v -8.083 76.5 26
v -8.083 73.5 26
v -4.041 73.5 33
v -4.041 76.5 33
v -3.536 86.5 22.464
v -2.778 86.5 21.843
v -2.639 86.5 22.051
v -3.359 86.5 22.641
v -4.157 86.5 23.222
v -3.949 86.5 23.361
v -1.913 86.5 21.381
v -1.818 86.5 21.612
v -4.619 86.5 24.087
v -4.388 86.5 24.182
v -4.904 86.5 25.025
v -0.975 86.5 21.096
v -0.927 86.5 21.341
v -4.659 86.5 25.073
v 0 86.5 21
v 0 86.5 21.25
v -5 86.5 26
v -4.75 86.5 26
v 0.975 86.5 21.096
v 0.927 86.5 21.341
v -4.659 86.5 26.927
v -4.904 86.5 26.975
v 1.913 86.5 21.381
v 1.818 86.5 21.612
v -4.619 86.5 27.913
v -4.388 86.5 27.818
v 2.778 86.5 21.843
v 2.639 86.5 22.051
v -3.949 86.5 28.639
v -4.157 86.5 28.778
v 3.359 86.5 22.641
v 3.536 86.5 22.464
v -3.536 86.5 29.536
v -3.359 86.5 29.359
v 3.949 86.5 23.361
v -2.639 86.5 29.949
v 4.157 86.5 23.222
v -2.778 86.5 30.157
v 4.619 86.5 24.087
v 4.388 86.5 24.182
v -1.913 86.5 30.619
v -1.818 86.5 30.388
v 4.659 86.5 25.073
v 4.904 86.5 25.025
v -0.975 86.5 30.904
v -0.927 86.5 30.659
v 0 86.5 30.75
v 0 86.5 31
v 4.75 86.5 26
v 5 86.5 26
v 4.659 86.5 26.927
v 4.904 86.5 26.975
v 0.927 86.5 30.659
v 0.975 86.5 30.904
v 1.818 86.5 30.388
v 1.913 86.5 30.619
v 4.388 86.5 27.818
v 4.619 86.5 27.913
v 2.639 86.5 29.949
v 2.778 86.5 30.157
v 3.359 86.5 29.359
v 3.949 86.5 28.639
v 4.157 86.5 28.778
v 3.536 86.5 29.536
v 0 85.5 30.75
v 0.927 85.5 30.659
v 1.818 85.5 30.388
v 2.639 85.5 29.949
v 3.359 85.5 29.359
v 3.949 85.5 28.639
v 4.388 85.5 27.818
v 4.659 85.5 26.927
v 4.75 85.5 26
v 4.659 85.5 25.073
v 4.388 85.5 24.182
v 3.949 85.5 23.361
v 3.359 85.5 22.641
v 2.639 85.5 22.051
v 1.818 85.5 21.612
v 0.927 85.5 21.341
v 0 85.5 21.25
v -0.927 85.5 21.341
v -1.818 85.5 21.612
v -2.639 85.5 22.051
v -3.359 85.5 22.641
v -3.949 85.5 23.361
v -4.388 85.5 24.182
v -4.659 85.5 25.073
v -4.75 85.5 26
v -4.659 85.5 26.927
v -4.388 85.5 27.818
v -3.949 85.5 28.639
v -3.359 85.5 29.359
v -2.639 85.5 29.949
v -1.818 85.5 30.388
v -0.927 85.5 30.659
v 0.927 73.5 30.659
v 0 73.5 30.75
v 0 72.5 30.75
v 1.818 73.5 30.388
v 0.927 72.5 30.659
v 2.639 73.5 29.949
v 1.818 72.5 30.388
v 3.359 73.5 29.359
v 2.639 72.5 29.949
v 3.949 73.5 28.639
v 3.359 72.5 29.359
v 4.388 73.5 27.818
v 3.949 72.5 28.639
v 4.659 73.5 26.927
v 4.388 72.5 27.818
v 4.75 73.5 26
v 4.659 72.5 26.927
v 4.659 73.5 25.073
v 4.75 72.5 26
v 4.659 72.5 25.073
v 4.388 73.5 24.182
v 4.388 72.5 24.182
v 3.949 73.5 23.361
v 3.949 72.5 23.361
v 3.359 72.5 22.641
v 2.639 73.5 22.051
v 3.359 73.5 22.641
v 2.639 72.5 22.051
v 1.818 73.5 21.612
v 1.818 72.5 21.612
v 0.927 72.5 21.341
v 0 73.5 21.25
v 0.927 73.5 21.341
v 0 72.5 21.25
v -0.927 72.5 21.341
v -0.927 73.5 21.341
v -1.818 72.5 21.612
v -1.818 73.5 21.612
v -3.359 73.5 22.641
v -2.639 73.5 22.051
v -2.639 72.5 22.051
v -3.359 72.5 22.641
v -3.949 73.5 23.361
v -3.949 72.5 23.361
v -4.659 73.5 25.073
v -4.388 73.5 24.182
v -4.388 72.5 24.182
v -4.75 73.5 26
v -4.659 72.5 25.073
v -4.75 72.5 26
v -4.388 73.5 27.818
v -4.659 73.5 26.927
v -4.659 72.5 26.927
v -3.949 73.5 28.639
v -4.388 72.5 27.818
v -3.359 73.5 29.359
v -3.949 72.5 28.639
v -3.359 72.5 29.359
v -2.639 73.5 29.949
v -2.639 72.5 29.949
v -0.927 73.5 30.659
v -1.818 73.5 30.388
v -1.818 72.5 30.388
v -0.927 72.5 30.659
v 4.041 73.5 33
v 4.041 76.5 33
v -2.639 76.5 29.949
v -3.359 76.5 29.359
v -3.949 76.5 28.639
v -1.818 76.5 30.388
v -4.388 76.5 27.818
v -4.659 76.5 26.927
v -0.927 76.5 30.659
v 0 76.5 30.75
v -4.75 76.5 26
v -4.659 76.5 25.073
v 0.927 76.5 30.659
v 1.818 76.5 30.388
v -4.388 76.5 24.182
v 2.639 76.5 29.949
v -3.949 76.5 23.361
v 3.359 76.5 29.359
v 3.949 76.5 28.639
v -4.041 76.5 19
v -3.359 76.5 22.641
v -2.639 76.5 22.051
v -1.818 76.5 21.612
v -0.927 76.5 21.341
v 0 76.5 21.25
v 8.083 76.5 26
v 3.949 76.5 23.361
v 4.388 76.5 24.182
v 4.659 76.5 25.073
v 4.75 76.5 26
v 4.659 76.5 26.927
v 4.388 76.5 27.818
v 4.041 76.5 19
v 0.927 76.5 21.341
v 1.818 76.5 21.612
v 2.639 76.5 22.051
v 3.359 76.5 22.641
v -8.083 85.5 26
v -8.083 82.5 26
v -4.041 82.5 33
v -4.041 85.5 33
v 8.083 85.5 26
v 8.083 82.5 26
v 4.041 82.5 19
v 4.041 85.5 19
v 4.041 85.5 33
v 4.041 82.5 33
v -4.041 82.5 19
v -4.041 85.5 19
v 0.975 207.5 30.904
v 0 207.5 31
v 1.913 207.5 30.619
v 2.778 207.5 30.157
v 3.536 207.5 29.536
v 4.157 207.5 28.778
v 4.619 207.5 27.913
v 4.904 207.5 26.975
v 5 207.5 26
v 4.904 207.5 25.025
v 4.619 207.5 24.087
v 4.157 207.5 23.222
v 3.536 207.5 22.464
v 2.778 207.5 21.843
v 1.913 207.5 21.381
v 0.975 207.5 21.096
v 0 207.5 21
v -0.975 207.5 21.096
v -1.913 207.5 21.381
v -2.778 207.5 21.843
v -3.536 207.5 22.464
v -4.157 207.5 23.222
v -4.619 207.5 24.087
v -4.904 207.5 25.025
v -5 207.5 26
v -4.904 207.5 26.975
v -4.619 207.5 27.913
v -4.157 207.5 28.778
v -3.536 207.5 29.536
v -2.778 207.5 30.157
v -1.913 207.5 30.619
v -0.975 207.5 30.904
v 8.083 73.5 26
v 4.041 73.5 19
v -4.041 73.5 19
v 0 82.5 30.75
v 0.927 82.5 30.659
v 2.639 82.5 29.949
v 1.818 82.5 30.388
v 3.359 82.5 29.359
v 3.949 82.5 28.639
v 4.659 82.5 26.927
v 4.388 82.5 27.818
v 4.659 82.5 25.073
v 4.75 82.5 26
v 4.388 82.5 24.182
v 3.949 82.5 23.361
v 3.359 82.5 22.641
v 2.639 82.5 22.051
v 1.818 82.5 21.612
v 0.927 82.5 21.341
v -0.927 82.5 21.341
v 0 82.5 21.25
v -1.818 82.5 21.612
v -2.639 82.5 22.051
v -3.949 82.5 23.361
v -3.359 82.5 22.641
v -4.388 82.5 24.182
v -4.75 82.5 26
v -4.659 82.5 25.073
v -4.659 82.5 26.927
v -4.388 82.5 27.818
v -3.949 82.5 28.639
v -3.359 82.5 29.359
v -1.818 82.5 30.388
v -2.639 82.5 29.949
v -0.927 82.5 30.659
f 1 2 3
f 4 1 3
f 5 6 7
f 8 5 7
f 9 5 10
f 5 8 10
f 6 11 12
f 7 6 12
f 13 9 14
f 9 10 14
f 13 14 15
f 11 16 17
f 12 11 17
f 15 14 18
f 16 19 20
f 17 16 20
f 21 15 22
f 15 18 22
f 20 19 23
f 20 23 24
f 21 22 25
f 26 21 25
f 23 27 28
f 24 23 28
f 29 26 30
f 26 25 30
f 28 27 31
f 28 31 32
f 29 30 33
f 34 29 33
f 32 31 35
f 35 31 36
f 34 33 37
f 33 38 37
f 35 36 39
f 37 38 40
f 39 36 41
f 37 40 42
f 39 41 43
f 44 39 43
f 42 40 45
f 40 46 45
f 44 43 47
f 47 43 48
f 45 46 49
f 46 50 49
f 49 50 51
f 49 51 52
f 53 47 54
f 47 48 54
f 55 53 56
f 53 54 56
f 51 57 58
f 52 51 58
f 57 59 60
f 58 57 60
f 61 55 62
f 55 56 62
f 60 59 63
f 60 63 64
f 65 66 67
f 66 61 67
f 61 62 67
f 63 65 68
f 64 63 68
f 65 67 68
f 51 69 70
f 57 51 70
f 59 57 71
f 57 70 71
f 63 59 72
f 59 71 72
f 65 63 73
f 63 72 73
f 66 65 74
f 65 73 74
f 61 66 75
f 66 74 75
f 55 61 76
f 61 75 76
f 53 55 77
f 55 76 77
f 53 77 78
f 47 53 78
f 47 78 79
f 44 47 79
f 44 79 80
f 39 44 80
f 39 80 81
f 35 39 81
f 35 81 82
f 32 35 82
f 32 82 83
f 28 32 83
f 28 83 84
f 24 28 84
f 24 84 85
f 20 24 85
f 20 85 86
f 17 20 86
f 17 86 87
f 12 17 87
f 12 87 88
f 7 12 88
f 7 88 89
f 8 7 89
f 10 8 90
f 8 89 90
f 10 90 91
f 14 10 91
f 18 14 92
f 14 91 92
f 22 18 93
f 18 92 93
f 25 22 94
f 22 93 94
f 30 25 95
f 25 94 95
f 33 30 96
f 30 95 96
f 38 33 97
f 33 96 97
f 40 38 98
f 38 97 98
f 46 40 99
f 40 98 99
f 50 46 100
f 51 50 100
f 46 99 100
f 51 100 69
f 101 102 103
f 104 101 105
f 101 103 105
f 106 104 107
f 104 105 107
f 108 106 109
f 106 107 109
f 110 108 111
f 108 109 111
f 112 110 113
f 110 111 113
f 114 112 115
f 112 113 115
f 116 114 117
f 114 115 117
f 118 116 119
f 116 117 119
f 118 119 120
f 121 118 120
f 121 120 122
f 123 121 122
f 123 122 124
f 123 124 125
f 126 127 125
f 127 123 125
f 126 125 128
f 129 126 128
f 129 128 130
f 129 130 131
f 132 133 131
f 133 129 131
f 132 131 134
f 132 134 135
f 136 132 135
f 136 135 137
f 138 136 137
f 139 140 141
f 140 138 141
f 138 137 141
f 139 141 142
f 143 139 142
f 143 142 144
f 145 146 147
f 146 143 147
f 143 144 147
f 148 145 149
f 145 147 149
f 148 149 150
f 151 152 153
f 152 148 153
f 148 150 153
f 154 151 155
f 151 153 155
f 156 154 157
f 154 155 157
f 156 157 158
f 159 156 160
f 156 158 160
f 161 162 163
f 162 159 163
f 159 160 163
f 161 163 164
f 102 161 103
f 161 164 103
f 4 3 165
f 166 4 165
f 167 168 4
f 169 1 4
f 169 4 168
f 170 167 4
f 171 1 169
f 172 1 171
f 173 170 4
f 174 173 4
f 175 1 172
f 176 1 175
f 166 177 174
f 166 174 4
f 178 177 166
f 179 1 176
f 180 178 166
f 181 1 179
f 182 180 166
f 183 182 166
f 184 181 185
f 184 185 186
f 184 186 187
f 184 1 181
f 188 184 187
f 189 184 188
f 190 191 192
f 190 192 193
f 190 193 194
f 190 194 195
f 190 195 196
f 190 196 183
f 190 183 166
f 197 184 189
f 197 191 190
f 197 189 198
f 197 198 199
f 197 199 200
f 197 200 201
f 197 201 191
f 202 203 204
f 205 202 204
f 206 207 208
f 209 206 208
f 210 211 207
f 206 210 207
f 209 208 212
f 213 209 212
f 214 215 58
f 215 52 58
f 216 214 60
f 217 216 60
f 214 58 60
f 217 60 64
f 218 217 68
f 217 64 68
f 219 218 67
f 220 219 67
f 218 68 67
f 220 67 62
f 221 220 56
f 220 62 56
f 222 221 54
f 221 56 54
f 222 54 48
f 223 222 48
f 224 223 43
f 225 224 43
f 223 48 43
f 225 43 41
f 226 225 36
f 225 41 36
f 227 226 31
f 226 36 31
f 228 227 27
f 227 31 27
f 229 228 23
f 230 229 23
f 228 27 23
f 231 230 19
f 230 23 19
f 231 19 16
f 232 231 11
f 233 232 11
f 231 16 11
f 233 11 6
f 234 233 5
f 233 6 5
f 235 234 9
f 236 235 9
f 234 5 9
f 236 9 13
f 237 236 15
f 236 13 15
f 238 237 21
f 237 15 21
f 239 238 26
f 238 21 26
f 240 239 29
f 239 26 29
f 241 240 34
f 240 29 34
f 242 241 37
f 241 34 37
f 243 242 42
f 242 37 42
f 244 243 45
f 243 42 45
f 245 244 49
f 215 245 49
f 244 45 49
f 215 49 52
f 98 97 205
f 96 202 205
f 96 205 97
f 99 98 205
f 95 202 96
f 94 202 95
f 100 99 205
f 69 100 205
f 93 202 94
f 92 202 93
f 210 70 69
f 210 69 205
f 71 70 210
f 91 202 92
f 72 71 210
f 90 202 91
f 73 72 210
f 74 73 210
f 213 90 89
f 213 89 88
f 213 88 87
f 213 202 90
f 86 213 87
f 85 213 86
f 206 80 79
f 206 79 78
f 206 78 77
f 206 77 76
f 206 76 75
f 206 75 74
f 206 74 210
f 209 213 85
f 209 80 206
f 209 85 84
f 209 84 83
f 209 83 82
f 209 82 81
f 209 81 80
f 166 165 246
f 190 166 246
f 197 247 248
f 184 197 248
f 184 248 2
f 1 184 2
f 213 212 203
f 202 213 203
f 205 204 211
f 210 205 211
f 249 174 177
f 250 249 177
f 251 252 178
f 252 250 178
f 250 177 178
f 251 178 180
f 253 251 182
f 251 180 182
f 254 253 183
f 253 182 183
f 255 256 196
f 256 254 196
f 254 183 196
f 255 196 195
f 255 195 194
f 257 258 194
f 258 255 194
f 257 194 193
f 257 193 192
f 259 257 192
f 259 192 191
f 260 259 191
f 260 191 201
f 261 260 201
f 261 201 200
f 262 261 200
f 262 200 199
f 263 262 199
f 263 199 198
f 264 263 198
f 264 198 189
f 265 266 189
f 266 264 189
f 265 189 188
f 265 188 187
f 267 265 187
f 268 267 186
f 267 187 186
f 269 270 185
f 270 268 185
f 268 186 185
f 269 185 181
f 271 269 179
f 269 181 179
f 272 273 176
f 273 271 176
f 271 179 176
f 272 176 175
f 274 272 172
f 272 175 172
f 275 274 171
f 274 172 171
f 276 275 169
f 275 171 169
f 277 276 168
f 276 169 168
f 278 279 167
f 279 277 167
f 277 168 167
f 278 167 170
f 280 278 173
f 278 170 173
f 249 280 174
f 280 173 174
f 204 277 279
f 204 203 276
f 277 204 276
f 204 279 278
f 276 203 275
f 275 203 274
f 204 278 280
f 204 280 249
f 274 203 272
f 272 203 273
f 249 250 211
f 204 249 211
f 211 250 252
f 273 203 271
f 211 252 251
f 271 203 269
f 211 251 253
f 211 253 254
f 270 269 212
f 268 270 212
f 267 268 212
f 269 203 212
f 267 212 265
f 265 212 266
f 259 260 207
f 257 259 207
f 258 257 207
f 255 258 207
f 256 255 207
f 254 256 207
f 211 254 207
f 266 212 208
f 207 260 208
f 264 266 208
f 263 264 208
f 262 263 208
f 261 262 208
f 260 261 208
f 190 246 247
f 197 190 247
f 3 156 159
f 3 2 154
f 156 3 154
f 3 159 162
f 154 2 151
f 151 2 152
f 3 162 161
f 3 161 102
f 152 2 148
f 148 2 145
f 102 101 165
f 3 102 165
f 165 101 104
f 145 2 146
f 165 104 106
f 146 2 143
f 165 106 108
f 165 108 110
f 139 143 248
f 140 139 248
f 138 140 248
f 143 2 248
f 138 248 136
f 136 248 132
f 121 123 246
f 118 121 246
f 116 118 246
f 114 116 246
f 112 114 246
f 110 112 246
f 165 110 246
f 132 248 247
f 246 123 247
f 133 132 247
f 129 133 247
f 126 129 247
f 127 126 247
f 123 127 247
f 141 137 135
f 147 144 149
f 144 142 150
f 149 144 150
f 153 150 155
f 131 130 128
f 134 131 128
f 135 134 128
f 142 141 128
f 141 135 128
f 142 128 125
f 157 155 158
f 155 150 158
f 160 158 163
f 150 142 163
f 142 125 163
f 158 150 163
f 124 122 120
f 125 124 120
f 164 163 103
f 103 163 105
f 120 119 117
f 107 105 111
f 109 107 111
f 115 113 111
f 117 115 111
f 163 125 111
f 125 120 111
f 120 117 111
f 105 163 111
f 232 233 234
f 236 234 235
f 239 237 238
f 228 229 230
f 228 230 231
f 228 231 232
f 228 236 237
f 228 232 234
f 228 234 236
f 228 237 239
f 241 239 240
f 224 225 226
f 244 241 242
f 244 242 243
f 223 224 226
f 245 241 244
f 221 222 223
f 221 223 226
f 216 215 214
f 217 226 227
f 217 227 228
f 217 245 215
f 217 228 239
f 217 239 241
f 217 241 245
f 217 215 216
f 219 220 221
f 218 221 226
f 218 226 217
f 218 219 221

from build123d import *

# Parameters (mm, degrees)
SKETCH1_R           = 4.75
BOSS_EXTRUDE1_DEPTH = 14
BOSS_EXTRUDE2_DEPTH = 3
BOSS_EXTRUDE3_DEPTH = 3
SKETCH4_R           = 5
BOSS_EXTRUDE4_DEPTH = 15
SKETCH5_R           = 5
BOSS_EXTRUDE5_DEPTH = 106


with BuildPart() as part:
    # Sketch1 → Boss-Extrude1 (new body)
    with BuildSketch(Plane(origin=(0, 72.5, 0), x_dir=(1, 0, 0), z_dir=(0, 1, 0))):
        with Locations(Location((0, -26, 0), (0, 0, 270))):
            Circle(SKETCH1_R)
    extrude(amount=BOSS_EXTRUDE1_DEPTH)

    # Sketch2 → Boss-Extrude2 (add)
    with BuildSketch(Plane(origin=(0, 73.5, 0), x_dir=(1, 0, 0), z_dir=(0, 1, 0))):
        Polygon((8.082903769, -26), (4.041451884, -19), (-4.041451884, -19), (-8.082903769, -26), (-4.041451884, -33), (4.041451884, -33), align=None)
    extrude(amount=BOSS_EXTRUDE2_DEPTH)

    # Sketch3 → Boss-Extrude3 (add)
    with BuildSketch(Plane(origin=(0, 82.5, 0), x_dir=(1, 0, 0), z_dir=(0, 1, 0))):
        Polygon((8.082903769, -26), (4.041451884, -19), (-4.041451884, -19), (-8.082903769, -26), (-4.041451884, -33), (4.041451884, -33), align=None)
    extrude(amount=BOSS_EXTRUDE3_DEPTH)

    # Sketch4 → Boss-Extrude4 (add)
    with BuildSketch(Plane(origin=(0, 86.5, 0), x_dir=(1, 0, 0), z_dir=(0, 1, 0))):
        with Locations(Location((0, -26, 0), (0, 0, 270))):
            Circle(SKETCH4_R)
    extrude(amount=BOSS_EXTRUDE4_DEPTH)

    # Sketch5 → Boss-Extrude5 (add)
    with BuildSketch(Plane(origin=(0, 101.5, 0), x_dir=(1, 0, 0), z_dir=(0, 1, 0))):
        with Locations(Location((0, -26, 0), (0, 0, 270))):
            Circle(SKETCH5_R)
    extrude(amount=BOSS_EXTRUDE5_DEPTH)


solid = part.part
